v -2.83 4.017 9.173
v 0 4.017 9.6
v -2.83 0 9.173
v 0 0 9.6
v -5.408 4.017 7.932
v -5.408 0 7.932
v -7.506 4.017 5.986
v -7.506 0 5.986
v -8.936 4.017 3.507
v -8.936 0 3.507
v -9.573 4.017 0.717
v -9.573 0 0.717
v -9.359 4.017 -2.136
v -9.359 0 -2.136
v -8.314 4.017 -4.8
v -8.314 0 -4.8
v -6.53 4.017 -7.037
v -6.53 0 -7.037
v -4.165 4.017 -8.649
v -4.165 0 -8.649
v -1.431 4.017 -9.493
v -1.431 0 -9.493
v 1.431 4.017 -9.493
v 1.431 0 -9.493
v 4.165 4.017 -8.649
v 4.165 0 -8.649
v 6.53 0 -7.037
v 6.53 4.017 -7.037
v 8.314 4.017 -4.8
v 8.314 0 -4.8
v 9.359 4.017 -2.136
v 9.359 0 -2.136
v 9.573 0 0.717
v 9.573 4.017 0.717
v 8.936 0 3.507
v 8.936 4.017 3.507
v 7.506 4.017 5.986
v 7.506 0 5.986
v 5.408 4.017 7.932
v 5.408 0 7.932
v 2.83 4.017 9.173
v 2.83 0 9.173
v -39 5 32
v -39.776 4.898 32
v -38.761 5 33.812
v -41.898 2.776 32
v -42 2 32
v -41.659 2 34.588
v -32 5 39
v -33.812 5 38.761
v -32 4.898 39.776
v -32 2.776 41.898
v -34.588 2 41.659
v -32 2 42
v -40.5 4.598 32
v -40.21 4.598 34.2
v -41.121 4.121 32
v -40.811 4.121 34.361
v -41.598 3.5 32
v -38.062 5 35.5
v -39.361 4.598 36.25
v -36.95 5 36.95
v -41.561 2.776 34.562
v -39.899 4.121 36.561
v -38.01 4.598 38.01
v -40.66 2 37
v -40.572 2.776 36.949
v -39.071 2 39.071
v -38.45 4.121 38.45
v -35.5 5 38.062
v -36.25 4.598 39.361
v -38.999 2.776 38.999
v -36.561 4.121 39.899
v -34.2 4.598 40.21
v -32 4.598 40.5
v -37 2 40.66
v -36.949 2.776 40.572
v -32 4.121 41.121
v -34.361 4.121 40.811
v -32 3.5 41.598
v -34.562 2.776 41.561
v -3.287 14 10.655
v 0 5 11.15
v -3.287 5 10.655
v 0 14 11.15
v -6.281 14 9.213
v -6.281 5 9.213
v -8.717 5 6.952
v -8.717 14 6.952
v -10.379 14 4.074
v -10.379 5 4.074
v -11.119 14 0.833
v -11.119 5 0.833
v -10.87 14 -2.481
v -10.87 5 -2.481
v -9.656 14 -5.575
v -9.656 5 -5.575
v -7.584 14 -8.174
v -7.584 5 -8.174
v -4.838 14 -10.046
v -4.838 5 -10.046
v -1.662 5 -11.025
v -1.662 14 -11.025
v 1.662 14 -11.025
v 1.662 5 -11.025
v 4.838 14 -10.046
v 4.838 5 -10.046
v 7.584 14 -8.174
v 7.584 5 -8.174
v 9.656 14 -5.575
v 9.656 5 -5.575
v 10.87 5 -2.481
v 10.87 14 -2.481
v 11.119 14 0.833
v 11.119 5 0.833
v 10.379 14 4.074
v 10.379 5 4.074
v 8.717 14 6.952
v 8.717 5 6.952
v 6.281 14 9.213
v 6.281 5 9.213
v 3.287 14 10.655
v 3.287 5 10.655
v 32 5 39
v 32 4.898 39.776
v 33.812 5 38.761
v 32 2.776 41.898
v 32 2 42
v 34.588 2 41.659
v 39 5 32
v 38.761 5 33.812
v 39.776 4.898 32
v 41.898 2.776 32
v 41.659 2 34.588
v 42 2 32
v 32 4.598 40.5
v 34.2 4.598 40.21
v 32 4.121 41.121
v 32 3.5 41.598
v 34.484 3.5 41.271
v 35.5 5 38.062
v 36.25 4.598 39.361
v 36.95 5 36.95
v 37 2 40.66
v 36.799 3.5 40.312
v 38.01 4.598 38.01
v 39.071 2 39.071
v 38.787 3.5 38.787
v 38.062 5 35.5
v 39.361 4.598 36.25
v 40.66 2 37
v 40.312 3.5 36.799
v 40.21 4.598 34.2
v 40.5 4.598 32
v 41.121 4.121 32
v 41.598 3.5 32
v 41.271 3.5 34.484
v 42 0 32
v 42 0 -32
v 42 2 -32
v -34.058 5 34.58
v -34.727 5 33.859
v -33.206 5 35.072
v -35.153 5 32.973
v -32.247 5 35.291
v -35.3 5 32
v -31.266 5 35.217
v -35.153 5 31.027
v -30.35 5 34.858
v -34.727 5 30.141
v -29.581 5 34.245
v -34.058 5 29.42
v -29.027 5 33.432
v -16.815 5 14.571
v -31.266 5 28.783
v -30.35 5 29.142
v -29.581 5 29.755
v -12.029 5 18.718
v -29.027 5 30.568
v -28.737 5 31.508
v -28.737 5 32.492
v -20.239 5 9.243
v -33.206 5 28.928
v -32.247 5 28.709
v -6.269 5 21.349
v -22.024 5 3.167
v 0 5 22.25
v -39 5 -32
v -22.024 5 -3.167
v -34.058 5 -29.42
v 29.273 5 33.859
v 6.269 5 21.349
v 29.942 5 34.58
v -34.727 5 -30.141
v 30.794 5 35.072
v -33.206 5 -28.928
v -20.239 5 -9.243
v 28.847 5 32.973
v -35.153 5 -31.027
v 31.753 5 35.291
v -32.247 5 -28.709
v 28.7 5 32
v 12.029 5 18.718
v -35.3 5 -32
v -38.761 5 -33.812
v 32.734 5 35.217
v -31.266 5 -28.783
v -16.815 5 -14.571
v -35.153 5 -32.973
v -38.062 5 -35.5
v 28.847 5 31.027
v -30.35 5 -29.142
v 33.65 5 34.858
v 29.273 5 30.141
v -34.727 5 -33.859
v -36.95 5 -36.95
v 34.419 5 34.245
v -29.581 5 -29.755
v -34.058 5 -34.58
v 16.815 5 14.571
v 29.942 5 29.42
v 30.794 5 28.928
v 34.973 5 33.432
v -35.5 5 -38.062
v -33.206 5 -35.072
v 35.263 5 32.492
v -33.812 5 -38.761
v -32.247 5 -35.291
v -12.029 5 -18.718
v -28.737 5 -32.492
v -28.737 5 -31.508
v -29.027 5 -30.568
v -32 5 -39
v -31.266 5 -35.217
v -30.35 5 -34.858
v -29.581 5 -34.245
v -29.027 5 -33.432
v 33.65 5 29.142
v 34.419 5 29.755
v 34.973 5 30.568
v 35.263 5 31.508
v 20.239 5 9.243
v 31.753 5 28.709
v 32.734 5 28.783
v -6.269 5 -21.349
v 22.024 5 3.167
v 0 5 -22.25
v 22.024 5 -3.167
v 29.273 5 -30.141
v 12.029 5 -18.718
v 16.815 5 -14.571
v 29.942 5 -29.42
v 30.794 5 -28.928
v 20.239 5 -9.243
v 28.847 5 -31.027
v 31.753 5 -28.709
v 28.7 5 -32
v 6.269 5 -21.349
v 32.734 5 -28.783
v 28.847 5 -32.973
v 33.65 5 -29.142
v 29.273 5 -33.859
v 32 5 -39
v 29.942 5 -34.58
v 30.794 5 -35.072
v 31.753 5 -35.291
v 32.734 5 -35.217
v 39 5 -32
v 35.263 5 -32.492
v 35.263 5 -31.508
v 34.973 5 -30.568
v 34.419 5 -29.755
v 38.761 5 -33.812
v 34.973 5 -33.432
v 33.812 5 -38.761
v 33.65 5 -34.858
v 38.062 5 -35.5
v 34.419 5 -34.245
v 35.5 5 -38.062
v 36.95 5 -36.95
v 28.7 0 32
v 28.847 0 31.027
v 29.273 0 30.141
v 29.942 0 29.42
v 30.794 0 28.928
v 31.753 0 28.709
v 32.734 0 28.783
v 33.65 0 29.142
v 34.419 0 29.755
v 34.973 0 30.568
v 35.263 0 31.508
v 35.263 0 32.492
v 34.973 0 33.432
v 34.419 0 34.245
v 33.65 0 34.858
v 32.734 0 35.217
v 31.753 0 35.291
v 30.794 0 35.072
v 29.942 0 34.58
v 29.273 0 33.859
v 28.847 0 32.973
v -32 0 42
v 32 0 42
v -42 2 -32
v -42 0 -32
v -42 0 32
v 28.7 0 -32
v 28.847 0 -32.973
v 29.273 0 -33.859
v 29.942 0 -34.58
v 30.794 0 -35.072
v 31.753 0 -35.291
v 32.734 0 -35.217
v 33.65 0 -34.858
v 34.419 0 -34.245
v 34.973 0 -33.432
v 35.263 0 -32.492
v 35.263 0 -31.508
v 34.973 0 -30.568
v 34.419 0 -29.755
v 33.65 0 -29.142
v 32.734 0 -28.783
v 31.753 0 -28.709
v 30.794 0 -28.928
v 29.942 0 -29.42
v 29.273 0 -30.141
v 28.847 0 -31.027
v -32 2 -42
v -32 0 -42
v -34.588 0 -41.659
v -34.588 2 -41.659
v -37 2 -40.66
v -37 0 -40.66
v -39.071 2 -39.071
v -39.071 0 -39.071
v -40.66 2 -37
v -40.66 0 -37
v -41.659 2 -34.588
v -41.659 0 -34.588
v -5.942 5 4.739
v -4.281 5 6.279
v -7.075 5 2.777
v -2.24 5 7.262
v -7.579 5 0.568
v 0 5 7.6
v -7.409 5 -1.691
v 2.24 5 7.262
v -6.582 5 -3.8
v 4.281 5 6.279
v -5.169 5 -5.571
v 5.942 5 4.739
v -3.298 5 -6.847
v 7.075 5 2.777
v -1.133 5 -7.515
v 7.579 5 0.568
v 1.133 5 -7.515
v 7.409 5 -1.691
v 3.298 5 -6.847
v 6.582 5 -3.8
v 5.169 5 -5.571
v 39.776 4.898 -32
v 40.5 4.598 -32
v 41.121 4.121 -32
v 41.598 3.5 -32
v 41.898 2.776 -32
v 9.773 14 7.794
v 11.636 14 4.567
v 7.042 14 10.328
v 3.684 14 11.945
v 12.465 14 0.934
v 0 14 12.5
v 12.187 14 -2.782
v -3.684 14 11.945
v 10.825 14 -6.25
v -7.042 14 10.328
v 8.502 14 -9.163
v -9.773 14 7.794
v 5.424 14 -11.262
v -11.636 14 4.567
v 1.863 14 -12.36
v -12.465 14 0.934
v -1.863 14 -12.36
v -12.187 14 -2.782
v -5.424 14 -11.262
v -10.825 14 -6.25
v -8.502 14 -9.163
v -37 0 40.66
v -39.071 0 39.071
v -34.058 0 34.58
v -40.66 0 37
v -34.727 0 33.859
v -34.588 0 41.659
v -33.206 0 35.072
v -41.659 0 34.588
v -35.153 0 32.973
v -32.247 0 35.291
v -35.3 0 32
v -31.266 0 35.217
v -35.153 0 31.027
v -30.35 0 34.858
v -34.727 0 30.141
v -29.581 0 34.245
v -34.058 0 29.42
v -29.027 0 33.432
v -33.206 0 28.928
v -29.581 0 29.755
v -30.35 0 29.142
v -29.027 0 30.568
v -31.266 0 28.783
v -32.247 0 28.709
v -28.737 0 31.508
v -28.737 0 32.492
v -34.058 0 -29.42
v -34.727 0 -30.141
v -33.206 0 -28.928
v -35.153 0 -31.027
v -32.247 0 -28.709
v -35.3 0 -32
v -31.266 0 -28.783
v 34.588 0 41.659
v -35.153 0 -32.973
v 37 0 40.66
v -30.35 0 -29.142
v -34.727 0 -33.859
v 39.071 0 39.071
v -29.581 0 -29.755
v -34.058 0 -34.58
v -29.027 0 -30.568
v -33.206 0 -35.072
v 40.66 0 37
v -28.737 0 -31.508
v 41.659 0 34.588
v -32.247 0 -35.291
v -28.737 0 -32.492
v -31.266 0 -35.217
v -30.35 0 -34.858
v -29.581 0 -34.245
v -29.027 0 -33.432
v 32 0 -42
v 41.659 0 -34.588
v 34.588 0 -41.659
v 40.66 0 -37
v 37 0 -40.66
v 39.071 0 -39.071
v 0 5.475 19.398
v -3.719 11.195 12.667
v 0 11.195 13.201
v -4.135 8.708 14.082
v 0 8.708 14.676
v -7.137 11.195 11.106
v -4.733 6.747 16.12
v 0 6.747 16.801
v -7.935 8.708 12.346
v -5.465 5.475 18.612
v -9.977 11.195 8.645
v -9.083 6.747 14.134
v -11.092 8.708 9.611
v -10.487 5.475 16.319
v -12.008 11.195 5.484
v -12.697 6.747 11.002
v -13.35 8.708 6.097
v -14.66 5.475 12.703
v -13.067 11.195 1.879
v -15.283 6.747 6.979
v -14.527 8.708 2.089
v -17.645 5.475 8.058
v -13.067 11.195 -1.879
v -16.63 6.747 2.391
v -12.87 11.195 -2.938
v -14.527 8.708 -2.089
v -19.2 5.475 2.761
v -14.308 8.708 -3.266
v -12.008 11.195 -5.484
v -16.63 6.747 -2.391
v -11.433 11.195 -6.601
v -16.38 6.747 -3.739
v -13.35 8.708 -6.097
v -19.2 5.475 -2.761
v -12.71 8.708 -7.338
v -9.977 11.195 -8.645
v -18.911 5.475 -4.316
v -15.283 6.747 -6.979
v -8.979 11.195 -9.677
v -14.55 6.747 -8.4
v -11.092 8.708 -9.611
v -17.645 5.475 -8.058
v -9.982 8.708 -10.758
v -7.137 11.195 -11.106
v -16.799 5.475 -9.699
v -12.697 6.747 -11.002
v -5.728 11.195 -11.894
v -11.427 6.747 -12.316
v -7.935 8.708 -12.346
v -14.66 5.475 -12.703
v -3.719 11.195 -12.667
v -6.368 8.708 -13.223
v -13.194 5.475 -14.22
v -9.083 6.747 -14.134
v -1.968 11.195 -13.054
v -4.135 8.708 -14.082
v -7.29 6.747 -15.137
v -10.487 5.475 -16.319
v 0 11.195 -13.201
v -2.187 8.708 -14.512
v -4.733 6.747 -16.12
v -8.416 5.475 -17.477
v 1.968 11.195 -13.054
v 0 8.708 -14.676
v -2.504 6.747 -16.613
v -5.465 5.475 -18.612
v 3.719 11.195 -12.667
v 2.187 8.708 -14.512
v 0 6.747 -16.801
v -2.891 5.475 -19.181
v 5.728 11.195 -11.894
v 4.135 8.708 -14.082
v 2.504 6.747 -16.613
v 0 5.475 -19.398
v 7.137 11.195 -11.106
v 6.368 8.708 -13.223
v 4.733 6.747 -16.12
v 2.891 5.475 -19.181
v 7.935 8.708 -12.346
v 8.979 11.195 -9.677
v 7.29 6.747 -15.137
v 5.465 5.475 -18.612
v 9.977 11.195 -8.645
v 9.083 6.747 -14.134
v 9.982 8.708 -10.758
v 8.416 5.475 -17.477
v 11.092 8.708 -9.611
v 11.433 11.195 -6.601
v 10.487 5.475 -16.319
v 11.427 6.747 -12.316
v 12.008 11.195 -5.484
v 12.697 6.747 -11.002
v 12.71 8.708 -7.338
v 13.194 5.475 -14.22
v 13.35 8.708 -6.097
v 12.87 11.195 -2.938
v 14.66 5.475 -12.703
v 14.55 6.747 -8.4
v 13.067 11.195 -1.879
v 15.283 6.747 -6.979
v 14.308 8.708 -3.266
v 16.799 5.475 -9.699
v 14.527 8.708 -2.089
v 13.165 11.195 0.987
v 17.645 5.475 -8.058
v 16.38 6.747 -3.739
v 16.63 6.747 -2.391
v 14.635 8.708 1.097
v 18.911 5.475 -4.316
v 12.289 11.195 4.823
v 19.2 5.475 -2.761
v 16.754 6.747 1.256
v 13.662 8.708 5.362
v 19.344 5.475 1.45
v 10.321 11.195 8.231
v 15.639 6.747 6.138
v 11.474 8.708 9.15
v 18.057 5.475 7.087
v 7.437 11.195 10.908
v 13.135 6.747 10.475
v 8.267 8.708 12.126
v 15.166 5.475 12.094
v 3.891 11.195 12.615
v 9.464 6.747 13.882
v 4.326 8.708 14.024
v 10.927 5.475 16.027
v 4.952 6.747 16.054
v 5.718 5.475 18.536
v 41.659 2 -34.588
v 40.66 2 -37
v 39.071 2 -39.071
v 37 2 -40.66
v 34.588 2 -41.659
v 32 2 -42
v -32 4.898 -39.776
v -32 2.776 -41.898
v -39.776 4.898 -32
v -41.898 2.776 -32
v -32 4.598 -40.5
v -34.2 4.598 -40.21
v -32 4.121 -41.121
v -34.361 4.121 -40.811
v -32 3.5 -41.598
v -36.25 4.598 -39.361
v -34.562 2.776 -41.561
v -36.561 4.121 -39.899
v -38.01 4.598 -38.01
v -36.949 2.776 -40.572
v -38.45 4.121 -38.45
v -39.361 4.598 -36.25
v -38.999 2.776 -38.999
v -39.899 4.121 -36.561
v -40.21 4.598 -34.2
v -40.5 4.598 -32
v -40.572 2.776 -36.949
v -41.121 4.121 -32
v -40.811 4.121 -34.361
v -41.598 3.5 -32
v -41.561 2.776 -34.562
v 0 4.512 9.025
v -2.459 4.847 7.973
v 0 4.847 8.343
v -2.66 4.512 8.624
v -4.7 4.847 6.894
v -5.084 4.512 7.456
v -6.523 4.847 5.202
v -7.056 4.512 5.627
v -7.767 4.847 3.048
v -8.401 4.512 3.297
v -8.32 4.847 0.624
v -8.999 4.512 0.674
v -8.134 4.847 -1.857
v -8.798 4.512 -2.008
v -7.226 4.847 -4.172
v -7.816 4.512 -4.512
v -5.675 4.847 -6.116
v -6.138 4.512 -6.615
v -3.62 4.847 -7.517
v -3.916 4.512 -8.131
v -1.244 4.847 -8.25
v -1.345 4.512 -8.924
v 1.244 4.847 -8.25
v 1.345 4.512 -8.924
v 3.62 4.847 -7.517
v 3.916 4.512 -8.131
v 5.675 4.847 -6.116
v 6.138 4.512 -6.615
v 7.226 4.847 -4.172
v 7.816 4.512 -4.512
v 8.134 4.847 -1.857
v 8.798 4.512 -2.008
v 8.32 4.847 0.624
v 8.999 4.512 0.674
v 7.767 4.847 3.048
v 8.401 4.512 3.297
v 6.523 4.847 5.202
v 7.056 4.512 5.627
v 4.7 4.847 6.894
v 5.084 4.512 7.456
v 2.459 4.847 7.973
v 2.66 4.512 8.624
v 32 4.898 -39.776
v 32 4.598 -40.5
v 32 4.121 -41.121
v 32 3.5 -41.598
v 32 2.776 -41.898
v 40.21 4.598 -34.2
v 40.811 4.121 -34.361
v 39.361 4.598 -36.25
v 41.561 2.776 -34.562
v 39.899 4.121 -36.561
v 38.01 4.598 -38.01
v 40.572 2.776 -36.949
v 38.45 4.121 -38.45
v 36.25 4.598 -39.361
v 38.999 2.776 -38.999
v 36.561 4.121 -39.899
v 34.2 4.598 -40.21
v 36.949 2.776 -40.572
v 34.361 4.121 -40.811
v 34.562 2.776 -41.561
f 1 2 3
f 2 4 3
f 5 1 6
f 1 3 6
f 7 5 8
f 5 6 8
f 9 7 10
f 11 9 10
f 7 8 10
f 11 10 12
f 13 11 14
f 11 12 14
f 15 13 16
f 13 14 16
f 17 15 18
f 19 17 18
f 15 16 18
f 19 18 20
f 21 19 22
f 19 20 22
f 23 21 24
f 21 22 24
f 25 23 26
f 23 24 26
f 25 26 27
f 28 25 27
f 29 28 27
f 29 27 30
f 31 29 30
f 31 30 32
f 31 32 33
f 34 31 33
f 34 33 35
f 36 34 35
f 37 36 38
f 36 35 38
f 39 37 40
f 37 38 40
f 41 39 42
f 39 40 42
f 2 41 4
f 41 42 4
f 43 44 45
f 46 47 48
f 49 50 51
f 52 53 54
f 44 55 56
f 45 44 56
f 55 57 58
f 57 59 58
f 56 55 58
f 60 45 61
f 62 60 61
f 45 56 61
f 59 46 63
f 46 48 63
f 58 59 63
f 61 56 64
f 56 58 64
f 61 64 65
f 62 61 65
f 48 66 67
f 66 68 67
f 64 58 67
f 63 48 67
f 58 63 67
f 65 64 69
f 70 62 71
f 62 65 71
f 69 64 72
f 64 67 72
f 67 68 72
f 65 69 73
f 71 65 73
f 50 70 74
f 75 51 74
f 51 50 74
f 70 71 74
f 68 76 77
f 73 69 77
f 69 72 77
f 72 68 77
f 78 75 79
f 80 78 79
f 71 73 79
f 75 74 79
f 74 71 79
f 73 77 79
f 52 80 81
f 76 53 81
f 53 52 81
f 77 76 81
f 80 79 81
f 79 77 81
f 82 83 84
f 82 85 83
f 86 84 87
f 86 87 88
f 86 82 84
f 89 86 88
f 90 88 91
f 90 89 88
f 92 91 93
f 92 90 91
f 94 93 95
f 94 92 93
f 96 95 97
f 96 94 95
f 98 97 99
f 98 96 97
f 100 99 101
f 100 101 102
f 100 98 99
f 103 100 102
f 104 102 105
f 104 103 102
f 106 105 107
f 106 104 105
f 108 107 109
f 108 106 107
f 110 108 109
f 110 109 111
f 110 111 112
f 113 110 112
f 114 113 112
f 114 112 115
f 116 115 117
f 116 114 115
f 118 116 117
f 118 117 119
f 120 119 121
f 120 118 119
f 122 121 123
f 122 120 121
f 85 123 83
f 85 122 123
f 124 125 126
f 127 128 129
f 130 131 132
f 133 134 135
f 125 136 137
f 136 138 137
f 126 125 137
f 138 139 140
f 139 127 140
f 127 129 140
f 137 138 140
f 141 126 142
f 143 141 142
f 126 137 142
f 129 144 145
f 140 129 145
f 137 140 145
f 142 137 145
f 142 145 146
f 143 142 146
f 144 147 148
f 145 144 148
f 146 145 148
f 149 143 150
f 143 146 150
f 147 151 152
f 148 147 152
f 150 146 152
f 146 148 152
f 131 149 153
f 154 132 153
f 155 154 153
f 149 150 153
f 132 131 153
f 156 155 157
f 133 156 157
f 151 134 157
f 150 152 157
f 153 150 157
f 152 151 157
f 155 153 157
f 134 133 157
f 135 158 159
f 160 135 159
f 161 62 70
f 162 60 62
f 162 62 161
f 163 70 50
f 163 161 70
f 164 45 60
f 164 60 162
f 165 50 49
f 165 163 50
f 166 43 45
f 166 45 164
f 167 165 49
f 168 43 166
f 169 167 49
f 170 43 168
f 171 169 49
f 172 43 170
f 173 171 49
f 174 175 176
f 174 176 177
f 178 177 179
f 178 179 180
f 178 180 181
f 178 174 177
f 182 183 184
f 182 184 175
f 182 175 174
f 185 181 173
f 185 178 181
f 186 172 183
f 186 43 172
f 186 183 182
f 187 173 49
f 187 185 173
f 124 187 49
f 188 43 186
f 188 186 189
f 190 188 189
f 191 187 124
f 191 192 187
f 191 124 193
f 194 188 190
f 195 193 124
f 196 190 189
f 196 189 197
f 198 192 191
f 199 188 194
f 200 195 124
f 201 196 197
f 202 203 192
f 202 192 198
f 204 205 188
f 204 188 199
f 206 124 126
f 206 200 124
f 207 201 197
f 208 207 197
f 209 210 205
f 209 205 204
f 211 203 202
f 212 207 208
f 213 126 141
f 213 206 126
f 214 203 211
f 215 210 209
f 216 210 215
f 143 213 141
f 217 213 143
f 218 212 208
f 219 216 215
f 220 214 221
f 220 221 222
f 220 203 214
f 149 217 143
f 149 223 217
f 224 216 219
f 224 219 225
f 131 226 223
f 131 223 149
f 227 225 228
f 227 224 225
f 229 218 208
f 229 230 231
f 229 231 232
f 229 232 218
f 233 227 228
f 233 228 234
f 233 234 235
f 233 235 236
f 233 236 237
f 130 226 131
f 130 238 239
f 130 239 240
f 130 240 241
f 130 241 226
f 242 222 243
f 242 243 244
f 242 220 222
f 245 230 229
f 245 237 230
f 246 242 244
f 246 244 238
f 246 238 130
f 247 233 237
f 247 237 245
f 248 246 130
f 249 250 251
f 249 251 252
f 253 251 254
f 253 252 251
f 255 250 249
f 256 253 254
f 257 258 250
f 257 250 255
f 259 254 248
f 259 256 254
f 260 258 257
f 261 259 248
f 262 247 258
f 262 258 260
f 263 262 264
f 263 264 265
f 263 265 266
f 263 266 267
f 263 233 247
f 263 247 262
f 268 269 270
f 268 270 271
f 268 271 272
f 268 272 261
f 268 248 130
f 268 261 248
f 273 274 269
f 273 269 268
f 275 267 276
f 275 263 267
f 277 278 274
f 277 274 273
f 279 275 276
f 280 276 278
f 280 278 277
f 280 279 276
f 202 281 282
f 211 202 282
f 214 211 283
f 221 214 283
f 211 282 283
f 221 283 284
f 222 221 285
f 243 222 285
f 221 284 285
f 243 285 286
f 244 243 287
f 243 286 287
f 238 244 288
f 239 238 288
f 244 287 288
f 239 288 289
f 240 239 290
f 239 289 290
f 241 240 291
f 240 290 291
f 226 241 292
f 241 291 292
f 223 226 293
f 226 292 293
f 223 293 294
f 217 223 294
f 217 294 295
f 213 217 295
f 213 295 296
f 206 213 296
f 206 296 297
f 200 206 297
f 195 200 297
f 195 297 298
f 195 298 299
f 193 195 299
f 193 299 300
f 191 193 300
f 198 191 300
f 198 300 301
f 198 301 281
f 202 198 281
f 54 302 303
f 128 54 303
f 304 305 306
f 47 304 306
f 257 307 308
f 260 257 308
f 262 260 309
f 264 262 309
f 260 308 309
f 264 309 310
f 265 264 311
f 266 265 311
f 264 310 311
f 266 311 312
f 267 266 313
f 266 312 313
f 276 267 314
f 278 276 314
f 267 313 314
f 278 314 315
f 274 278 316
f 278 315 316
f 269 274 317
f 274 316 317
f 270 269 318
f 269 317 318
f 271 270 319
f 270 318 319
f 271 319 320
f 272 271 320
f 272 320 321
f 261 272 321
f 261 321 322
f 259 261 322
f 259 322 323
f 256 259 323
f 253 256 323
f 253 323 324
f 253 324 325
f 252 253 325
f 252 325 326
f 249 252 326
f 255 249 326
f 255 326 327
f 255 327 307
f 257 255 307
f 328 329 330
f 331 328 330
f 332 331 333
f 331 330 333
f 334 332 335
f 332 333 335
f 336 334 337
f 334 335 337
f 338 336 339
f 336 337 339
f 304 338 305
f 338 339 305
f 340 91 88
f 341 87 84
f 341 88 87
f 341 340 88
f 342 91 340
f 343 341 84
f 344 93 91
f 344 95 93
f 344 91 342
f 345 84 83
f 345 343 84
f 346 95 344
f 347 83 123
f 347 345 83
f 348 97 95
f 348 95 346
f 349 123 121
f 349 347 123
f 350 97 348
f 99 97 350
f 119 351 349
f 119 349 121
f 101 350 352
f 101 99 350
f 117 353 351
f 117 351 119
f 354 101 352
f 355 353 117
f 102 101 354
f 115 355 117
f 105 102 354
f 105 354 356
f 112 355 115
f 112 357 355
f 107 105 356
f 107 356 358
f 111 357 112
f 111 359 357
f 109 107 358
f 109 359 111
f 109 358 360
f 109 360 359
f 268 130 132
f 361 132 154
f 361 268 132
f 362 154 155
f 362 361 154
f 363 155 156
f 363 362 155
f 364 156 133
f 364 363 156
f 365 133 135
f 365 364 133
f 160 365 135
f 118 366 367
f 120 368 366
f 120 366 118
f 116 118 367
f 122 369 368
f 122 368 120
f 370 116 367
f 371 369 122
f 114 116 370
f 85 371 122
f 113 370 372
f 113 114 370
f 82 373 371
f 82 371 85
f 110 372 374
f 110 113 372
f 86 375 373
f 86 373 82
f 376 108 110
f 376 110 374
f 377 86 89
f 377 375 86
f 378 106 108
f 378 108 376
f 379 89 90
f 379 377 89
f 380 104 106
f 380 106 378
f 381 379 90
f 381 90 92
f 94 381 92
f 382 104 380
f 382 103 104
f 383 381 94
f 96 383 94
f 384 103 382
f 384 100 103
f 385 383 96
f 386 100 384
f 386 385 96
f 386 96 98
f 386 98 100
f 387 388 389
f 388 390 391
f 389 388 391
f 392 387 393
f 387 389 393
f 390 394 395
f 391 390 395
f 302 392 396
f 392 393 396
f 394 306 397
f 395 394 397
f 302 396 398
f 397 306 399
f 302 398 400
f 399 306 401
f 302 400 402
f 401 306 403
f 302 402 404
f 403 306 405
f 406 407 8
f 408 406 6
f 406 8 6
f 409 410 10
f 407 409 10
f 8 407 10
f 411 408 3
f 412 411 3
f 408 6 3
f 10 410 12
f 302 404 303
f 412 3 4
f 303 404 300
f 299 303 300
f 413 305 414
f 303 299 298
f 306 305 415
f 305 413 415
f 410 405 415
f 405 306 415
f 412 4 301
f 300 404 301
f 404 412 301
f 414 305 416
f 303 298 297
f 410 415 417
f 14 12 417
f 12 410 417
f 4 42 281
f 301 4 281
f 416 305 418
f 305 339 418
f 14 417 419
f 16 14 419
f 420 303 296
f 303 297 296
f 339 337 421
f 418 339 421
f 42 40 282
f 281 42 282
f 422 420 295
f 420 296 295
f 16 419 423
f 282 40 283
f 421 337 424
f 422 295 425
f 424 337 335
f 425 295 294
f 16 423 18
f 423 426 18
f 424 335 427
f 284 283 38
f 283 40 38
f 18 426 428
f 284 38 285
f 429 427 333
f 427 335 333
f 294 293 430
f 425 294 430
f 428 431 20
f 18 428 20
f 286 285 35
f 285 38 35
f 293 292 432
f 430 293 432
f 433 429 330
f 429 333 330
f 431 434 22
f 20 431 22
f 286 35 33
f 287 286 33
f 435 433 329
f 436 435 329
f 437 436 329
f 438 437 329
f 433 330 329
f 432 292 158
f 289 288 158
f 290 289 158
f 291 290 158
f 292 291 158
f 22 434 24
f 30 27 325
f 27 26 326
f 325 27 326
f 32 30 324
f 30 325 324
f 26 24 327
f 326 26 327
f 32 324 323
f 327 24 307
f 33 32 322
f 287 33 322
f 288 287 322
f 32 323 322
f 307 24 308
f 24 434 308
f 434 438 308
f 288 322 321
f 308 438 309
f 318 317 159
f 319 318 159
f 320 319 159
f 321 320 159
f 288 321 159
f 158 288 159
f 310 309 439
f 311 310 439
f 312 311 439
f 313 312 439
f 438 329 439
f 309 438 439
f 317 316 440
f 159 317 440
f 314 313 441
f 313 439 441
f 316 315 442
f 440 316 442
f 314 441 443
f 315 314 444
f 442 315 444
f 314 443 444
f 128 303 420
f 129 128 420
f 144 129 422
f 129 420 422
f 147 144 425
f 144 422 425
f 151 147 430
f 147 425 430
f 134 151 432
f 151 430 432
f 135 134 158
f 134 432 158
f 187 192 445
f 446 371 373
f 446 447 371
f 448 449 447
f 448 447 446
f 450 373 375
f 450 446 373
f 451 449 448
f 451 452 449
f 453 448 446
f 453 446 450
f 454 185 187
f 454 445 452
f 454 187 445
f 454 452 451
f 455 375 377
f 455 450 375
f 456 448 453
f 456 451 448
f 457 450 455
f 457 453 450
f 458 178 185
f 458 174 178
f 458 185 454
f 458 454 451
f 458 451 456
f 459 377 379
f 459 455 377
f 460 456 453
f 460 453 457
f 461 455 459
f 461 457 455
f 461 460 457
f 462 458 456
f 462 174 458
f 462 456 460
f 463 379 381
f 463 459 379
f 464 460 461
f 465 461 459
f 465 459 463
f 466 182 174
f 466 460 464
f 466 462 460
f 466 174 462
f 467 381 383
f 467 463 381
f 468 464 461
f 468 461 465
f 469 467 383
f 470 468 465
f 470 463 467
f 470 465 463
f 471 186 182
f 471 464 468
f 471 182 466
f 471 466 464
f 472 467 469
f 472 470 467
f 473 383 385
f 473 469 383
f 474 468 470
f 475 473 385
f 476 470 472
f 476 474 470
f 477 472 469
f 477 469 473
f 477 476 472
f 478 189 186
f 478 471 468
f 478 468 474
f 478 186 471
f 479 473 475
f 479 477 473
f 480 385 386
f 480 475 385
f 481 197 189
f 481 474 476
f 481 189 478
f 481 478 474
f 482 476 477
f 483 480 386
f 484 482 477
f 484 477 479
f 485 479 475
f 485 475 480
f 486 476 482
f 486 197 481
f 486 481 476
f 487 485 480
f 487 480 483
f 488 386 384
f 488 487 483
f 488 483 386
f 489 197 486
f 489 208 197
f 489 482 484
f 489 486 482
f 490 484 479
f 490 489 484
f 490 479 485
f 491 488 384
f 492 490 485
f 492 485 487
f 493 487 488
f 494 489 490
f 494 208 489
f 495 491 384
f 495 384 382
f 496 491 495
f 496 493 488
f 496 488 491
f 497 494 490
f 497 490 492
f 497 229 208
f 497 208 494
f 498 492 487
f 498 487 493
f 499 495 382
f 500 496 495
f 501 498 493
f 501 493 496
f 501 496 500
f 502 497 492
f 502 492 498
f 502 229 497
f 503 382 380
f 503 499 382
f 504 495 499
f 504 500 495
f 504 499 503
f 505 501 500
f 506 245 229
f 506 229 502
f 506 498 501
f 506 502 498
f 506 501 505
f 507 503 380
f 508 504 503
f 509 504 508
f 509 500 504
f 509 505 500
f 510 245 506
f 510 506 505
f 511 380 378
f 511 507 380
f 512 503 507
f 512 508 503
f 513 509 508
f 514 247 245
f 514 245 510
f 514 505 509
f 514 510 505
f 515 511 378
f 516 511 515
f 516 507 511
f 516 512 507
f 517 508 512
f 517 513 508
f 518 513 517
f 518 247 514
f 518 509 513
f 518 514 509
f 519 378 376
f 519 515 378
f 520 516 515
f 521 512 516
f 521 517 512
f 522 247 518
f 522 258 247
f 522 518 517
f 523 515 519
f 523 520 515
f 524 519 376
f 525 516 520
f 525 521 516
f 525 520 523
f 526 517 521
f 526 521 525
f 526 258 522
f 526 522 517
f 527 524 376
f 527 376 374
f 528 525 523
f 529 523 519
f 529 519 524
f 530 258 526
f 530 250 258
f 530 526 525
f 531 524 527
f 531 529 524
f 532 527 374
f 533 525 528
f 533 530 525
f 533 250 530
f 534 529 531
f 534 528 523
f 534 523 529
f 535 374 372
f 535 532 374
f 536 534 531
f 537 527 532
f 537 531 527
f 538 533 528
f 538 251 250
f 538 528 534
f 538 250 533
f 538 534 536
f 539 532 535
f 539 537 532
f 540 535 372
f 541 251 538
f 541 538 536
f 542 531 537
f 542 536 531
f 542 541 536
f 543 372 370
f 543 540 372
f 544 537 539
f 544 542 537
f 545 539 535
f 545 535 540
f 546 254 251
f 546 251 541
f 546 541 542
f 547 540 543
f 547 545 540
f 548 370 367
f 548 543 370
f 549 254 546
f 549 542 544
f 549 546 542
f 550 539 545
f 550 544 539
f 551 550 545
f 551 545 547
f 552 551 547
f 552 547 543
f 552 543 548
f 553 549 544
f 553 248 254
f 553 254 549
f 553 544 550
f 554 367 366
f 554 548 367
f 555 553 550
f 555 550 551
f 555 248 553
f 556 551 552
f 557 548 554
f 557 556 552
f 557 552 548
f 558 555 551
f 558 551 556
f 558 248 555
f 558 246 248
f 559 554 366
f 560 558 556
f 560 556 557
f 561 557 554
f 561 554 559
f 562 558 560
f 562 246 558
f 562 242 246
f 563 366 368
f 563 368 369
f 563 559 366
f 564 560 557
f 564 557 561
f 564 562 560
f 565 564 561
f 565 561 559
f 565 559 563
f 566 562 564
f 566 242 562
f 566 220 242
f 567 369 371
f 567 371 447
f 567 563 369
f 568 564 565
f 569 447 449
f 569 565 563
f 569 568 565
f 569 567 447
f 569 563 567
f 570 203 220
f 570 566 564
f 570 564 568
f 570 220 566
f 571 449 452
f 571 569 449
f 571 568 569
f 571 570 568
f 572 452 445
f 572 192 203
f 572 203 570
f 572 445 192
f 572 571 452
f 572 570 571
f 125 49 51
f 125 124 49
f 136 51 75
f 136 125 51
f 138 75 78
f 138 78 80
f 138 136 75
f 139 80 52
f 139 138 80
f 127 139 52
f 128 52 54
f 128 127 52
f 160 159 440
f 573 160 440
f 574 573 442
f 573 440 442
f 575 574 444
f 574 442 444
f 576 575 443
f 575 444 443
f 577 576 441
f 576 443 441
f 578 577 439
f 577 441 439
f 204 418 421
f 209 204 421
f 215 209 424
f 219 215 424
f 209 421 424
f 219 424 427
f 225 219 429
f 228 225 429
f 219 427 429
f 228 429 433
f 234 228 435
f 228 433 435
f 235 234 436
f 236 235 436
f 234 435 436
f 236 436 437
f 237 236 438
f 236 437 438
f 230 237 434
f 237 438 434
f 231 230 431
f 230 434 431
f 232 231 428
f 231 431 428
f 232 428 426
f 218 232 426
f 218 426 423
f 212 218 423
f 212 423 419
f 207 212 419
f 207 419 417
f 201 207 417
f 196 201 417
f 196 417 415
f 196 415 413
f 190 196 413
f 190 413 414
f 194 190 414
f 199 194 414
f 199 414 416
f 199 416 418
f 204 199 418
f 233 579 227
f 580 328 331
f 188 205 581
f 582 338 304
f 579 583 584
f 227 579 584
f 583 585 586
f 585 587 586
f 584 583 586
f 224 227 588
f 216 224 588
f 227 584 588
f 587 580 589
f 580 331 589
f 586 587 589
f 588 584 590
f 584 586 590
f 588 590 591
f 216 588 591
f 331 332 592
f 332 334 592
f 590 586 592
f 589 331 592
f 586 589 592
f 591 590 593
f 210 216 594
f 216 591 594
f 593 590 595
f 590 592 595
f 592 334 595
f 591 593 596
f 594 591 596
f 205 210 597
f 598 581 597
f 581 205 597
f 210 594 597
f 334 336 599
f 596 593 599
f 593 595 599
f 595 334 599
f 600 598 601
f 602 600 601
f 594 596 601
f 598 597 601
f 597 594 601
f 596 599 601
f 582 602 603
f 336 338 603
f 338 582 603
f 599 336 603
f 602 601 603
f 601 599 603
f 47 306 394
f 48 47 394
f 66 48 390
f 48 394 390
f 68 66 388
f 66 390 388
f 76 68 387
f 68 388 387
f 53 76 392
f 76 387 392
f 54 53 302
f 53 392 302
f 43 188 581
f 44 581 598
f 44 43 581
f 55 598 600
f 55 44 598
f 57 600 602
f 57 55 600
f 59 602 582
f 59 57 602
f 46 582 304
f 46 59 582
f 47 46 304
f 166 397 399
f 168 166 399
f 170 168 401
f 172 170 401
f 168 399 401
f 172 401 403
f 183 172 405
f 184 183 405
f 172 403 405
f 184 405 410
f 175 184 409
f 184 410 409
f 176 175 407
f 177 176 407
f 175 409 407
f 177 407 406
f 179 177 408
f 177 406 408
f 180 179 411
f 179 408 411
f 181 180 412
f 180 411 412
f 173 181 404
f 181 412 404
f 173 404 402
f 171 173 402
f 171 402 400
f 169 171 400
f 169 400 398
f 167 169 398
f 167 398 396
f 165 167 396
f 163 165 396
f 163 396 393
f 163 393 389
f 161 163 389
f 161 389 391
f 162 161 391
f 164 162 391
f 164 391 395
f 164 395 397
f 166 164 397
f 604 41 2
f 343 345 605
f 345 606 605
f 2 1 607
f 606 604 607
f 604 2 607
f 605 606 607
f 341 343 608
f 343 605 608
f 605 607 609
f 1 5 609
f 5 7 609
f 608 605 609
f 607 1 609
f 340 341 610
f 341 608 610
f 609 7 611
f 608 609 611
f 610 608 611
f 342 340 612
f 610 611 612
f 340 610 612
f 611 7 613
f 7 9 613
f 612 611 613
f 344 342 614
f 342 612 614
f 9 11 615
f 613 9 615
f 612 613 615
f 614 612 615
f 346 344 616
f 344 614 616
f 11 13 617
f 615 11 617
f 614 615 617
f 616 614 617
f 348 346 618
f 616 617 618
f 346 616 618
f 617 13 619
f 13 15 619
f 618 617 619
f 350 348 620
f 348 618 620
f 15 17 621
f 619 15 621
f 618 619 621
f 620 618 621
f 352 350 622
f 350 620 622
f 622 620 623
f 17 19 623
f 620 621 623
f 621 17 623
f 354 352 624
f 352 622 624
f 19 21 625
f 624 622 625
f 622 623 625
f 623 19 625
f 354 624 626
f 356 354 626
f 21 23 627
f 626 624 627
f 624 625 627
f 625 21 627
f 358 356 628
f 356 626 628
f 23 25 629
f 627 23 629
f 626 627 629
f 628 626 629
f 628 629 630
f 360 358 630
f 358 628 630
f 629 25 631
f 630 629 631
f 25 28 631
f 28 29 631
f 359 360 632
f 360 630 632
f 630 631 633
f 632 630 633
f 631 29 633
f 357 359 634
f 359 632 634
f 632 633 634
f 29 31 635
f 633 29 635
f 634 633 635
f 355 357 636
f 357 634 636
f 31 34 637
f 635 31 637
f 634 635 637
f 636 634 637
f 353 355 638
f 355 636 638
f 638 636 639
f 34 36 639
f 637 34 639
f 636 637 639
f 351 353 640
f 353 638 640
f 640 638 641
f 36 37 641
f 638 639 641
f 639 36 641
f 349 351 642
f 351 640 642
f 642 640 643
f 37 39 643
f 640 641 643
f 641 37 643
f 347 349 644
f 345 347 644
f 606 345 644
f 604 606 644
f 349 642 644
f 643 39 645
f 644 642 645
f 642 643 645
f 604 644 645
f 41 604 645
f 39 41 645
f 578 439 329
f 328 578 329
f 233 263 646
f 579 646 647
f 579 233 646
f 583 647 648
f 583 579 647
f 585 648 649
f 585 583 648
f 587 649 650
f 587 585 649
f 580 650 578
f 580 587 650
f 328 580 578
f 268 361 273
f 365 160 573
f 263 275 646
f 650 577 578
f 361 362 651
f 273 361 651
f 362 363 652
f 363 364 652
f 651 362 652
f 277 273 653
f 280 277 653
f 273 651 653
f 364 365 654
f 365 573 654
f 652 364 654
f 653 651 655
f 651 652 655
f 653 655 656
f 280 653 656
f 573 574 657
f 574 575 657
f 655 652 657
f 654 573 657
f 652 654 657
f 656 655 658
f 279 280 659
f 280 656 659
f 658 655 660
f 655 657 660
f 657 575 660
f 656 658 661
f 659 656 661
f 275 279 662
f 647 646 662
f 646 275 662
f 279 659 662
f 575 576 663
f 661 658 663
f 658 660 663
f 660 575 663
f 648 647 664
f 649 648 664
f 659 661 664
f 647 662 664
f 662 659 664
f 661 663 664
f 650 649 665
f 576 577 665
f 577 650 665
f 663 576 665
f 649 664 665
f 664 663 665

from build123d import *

# Parameters (mm, degrees)
BOSS_EXTRUDE1_DEPTH      = 5
FILLET1_R                = 3
M6_CLEARANCE_HOLE1_D     = 6.6
M6_CLEARANCE_HOLE1_DEPTH = 8
M6_CLEARANCE_HOLE1_TIP   = 1.982840043


with BuildPart() as part:
    # Sketch1 → Boss-Extrude1 (new body)
    with BuildSketch(Plane(origin=(0, 0, 0), x_dir=(1, 0, 0), z_dir=(0, 1, 0))):
        with BuildLine():
            Line((32, 42), (-32, 42))
            ThreePointArc((-32, 42), (-39.071067812, 39.071067812), (-42, 32))
            Line((-42, 32), (-42, -32))
            ThreePointArc((-42, -32), (-39.071067812, -39.071067812), (-32, -42))
            Line((-32, -42), (32, -42))
            ThreePointArc((32, -42), (39.071067812, -39.071067812), (42, -32))
            Line((42, -32), (42, 32))
            ThreePointArc((42, 32), (39.071067812, 39.071067812), (32, 42))
        make_face()
    extrude(amount=BOSS_EXTRUDE1_DEPTH)

    # Sketch3 → Revolve2 (revolve)
    with BuildSketch(Plane.XY):
        with BuildLine():
            Line((-22.25, 5), (-12.5, 5))
            Line((-12.5, 5), (-11.15, 5))
            Line((-11.15, 5), (-11.15, 14))
            Line((-11.15, 14), (-12.5, 14))
            ThreePointArc((-12.5, 14), (-15.66727432, 7.649963846), (-22.25, 5))
        make_face()
        with BuildLine():
            Line((-22.25, 5), (-12.5, 5))
            Line((-12.5, 5), (-11.15, 5))
            Line((-11.15, 5), (-11.15, 14))
            Line((-11.15, 14), (-12.5, 14))
            ThreePointArc((-12.5, 14), (-15.66727432, 7.649963846), (-22.25, 5))
        make_face()
    revolve(axis=Axis((0, 0, 0), (0, -1, 0)))

    # Sketch3<5> → Cut-Revolve2 (revolve, cut)
    with BuildSketch(Plane.XY):
        with BuildLine():
            Line((0, 0), (0, 5))
            Line((0, 5), (-7.6, 5))
            ThreePointArc((-7.6, 5), (-8.694616444, 4.701278719), (-9.6, 4.017392631))
            Line((-9.6, 4.017392631), (-9.6, 0))
            Line((-9.6, 0), (0, 0))
        make_face()
    revolve(axis=Axis((0, 0, 0), (0, -1, 0)), mode=Mode.SUBTRACT)

    # Fillet1
    fillet1_edges = [part.edges().sort_by_distance(p)[0] for p in [
        (42, 5, 0),
        (39.071067812, 5, -39.071067812),
        (0, 5, -42),
        (-39.071067812, 5, -39.071067812),
        (-42, 5, 0),
        (-39.071067812, 5, 39.071067812),
        (0, 5, 42),
        (39.071067812, 5, 39.071067812),
    ]]
    fillet(fillet1_edges, radius=FILLET1_R)

    # M6 Clearance Hole1
    with Locations(Plane(origin=(0, 5, 0), x_dir=(1, 0, 0), z_dir=(0, 1, 0))):
        with Locations((-32, 32), (-32, -32), (32, -32), (32, 32)):
            Hole(M6_CLEARANCE_HOLE1_D / 2, depth=M6_CLEARANCE_HOLE1_DEPTH)
            with Locations((0, 0, -(M6_CLEARANCE_HOLE1_DEPTH + M6_CLEARANCE_HOLE1_TIP / 2))):  # 118° drill point
                Cone(0, M6_CLEARANCE_HOLE1_D / 2, M6_CLEARANCE_HOLE1_TIP, mode=Mode.SUBTRACT)


solid = part.part
